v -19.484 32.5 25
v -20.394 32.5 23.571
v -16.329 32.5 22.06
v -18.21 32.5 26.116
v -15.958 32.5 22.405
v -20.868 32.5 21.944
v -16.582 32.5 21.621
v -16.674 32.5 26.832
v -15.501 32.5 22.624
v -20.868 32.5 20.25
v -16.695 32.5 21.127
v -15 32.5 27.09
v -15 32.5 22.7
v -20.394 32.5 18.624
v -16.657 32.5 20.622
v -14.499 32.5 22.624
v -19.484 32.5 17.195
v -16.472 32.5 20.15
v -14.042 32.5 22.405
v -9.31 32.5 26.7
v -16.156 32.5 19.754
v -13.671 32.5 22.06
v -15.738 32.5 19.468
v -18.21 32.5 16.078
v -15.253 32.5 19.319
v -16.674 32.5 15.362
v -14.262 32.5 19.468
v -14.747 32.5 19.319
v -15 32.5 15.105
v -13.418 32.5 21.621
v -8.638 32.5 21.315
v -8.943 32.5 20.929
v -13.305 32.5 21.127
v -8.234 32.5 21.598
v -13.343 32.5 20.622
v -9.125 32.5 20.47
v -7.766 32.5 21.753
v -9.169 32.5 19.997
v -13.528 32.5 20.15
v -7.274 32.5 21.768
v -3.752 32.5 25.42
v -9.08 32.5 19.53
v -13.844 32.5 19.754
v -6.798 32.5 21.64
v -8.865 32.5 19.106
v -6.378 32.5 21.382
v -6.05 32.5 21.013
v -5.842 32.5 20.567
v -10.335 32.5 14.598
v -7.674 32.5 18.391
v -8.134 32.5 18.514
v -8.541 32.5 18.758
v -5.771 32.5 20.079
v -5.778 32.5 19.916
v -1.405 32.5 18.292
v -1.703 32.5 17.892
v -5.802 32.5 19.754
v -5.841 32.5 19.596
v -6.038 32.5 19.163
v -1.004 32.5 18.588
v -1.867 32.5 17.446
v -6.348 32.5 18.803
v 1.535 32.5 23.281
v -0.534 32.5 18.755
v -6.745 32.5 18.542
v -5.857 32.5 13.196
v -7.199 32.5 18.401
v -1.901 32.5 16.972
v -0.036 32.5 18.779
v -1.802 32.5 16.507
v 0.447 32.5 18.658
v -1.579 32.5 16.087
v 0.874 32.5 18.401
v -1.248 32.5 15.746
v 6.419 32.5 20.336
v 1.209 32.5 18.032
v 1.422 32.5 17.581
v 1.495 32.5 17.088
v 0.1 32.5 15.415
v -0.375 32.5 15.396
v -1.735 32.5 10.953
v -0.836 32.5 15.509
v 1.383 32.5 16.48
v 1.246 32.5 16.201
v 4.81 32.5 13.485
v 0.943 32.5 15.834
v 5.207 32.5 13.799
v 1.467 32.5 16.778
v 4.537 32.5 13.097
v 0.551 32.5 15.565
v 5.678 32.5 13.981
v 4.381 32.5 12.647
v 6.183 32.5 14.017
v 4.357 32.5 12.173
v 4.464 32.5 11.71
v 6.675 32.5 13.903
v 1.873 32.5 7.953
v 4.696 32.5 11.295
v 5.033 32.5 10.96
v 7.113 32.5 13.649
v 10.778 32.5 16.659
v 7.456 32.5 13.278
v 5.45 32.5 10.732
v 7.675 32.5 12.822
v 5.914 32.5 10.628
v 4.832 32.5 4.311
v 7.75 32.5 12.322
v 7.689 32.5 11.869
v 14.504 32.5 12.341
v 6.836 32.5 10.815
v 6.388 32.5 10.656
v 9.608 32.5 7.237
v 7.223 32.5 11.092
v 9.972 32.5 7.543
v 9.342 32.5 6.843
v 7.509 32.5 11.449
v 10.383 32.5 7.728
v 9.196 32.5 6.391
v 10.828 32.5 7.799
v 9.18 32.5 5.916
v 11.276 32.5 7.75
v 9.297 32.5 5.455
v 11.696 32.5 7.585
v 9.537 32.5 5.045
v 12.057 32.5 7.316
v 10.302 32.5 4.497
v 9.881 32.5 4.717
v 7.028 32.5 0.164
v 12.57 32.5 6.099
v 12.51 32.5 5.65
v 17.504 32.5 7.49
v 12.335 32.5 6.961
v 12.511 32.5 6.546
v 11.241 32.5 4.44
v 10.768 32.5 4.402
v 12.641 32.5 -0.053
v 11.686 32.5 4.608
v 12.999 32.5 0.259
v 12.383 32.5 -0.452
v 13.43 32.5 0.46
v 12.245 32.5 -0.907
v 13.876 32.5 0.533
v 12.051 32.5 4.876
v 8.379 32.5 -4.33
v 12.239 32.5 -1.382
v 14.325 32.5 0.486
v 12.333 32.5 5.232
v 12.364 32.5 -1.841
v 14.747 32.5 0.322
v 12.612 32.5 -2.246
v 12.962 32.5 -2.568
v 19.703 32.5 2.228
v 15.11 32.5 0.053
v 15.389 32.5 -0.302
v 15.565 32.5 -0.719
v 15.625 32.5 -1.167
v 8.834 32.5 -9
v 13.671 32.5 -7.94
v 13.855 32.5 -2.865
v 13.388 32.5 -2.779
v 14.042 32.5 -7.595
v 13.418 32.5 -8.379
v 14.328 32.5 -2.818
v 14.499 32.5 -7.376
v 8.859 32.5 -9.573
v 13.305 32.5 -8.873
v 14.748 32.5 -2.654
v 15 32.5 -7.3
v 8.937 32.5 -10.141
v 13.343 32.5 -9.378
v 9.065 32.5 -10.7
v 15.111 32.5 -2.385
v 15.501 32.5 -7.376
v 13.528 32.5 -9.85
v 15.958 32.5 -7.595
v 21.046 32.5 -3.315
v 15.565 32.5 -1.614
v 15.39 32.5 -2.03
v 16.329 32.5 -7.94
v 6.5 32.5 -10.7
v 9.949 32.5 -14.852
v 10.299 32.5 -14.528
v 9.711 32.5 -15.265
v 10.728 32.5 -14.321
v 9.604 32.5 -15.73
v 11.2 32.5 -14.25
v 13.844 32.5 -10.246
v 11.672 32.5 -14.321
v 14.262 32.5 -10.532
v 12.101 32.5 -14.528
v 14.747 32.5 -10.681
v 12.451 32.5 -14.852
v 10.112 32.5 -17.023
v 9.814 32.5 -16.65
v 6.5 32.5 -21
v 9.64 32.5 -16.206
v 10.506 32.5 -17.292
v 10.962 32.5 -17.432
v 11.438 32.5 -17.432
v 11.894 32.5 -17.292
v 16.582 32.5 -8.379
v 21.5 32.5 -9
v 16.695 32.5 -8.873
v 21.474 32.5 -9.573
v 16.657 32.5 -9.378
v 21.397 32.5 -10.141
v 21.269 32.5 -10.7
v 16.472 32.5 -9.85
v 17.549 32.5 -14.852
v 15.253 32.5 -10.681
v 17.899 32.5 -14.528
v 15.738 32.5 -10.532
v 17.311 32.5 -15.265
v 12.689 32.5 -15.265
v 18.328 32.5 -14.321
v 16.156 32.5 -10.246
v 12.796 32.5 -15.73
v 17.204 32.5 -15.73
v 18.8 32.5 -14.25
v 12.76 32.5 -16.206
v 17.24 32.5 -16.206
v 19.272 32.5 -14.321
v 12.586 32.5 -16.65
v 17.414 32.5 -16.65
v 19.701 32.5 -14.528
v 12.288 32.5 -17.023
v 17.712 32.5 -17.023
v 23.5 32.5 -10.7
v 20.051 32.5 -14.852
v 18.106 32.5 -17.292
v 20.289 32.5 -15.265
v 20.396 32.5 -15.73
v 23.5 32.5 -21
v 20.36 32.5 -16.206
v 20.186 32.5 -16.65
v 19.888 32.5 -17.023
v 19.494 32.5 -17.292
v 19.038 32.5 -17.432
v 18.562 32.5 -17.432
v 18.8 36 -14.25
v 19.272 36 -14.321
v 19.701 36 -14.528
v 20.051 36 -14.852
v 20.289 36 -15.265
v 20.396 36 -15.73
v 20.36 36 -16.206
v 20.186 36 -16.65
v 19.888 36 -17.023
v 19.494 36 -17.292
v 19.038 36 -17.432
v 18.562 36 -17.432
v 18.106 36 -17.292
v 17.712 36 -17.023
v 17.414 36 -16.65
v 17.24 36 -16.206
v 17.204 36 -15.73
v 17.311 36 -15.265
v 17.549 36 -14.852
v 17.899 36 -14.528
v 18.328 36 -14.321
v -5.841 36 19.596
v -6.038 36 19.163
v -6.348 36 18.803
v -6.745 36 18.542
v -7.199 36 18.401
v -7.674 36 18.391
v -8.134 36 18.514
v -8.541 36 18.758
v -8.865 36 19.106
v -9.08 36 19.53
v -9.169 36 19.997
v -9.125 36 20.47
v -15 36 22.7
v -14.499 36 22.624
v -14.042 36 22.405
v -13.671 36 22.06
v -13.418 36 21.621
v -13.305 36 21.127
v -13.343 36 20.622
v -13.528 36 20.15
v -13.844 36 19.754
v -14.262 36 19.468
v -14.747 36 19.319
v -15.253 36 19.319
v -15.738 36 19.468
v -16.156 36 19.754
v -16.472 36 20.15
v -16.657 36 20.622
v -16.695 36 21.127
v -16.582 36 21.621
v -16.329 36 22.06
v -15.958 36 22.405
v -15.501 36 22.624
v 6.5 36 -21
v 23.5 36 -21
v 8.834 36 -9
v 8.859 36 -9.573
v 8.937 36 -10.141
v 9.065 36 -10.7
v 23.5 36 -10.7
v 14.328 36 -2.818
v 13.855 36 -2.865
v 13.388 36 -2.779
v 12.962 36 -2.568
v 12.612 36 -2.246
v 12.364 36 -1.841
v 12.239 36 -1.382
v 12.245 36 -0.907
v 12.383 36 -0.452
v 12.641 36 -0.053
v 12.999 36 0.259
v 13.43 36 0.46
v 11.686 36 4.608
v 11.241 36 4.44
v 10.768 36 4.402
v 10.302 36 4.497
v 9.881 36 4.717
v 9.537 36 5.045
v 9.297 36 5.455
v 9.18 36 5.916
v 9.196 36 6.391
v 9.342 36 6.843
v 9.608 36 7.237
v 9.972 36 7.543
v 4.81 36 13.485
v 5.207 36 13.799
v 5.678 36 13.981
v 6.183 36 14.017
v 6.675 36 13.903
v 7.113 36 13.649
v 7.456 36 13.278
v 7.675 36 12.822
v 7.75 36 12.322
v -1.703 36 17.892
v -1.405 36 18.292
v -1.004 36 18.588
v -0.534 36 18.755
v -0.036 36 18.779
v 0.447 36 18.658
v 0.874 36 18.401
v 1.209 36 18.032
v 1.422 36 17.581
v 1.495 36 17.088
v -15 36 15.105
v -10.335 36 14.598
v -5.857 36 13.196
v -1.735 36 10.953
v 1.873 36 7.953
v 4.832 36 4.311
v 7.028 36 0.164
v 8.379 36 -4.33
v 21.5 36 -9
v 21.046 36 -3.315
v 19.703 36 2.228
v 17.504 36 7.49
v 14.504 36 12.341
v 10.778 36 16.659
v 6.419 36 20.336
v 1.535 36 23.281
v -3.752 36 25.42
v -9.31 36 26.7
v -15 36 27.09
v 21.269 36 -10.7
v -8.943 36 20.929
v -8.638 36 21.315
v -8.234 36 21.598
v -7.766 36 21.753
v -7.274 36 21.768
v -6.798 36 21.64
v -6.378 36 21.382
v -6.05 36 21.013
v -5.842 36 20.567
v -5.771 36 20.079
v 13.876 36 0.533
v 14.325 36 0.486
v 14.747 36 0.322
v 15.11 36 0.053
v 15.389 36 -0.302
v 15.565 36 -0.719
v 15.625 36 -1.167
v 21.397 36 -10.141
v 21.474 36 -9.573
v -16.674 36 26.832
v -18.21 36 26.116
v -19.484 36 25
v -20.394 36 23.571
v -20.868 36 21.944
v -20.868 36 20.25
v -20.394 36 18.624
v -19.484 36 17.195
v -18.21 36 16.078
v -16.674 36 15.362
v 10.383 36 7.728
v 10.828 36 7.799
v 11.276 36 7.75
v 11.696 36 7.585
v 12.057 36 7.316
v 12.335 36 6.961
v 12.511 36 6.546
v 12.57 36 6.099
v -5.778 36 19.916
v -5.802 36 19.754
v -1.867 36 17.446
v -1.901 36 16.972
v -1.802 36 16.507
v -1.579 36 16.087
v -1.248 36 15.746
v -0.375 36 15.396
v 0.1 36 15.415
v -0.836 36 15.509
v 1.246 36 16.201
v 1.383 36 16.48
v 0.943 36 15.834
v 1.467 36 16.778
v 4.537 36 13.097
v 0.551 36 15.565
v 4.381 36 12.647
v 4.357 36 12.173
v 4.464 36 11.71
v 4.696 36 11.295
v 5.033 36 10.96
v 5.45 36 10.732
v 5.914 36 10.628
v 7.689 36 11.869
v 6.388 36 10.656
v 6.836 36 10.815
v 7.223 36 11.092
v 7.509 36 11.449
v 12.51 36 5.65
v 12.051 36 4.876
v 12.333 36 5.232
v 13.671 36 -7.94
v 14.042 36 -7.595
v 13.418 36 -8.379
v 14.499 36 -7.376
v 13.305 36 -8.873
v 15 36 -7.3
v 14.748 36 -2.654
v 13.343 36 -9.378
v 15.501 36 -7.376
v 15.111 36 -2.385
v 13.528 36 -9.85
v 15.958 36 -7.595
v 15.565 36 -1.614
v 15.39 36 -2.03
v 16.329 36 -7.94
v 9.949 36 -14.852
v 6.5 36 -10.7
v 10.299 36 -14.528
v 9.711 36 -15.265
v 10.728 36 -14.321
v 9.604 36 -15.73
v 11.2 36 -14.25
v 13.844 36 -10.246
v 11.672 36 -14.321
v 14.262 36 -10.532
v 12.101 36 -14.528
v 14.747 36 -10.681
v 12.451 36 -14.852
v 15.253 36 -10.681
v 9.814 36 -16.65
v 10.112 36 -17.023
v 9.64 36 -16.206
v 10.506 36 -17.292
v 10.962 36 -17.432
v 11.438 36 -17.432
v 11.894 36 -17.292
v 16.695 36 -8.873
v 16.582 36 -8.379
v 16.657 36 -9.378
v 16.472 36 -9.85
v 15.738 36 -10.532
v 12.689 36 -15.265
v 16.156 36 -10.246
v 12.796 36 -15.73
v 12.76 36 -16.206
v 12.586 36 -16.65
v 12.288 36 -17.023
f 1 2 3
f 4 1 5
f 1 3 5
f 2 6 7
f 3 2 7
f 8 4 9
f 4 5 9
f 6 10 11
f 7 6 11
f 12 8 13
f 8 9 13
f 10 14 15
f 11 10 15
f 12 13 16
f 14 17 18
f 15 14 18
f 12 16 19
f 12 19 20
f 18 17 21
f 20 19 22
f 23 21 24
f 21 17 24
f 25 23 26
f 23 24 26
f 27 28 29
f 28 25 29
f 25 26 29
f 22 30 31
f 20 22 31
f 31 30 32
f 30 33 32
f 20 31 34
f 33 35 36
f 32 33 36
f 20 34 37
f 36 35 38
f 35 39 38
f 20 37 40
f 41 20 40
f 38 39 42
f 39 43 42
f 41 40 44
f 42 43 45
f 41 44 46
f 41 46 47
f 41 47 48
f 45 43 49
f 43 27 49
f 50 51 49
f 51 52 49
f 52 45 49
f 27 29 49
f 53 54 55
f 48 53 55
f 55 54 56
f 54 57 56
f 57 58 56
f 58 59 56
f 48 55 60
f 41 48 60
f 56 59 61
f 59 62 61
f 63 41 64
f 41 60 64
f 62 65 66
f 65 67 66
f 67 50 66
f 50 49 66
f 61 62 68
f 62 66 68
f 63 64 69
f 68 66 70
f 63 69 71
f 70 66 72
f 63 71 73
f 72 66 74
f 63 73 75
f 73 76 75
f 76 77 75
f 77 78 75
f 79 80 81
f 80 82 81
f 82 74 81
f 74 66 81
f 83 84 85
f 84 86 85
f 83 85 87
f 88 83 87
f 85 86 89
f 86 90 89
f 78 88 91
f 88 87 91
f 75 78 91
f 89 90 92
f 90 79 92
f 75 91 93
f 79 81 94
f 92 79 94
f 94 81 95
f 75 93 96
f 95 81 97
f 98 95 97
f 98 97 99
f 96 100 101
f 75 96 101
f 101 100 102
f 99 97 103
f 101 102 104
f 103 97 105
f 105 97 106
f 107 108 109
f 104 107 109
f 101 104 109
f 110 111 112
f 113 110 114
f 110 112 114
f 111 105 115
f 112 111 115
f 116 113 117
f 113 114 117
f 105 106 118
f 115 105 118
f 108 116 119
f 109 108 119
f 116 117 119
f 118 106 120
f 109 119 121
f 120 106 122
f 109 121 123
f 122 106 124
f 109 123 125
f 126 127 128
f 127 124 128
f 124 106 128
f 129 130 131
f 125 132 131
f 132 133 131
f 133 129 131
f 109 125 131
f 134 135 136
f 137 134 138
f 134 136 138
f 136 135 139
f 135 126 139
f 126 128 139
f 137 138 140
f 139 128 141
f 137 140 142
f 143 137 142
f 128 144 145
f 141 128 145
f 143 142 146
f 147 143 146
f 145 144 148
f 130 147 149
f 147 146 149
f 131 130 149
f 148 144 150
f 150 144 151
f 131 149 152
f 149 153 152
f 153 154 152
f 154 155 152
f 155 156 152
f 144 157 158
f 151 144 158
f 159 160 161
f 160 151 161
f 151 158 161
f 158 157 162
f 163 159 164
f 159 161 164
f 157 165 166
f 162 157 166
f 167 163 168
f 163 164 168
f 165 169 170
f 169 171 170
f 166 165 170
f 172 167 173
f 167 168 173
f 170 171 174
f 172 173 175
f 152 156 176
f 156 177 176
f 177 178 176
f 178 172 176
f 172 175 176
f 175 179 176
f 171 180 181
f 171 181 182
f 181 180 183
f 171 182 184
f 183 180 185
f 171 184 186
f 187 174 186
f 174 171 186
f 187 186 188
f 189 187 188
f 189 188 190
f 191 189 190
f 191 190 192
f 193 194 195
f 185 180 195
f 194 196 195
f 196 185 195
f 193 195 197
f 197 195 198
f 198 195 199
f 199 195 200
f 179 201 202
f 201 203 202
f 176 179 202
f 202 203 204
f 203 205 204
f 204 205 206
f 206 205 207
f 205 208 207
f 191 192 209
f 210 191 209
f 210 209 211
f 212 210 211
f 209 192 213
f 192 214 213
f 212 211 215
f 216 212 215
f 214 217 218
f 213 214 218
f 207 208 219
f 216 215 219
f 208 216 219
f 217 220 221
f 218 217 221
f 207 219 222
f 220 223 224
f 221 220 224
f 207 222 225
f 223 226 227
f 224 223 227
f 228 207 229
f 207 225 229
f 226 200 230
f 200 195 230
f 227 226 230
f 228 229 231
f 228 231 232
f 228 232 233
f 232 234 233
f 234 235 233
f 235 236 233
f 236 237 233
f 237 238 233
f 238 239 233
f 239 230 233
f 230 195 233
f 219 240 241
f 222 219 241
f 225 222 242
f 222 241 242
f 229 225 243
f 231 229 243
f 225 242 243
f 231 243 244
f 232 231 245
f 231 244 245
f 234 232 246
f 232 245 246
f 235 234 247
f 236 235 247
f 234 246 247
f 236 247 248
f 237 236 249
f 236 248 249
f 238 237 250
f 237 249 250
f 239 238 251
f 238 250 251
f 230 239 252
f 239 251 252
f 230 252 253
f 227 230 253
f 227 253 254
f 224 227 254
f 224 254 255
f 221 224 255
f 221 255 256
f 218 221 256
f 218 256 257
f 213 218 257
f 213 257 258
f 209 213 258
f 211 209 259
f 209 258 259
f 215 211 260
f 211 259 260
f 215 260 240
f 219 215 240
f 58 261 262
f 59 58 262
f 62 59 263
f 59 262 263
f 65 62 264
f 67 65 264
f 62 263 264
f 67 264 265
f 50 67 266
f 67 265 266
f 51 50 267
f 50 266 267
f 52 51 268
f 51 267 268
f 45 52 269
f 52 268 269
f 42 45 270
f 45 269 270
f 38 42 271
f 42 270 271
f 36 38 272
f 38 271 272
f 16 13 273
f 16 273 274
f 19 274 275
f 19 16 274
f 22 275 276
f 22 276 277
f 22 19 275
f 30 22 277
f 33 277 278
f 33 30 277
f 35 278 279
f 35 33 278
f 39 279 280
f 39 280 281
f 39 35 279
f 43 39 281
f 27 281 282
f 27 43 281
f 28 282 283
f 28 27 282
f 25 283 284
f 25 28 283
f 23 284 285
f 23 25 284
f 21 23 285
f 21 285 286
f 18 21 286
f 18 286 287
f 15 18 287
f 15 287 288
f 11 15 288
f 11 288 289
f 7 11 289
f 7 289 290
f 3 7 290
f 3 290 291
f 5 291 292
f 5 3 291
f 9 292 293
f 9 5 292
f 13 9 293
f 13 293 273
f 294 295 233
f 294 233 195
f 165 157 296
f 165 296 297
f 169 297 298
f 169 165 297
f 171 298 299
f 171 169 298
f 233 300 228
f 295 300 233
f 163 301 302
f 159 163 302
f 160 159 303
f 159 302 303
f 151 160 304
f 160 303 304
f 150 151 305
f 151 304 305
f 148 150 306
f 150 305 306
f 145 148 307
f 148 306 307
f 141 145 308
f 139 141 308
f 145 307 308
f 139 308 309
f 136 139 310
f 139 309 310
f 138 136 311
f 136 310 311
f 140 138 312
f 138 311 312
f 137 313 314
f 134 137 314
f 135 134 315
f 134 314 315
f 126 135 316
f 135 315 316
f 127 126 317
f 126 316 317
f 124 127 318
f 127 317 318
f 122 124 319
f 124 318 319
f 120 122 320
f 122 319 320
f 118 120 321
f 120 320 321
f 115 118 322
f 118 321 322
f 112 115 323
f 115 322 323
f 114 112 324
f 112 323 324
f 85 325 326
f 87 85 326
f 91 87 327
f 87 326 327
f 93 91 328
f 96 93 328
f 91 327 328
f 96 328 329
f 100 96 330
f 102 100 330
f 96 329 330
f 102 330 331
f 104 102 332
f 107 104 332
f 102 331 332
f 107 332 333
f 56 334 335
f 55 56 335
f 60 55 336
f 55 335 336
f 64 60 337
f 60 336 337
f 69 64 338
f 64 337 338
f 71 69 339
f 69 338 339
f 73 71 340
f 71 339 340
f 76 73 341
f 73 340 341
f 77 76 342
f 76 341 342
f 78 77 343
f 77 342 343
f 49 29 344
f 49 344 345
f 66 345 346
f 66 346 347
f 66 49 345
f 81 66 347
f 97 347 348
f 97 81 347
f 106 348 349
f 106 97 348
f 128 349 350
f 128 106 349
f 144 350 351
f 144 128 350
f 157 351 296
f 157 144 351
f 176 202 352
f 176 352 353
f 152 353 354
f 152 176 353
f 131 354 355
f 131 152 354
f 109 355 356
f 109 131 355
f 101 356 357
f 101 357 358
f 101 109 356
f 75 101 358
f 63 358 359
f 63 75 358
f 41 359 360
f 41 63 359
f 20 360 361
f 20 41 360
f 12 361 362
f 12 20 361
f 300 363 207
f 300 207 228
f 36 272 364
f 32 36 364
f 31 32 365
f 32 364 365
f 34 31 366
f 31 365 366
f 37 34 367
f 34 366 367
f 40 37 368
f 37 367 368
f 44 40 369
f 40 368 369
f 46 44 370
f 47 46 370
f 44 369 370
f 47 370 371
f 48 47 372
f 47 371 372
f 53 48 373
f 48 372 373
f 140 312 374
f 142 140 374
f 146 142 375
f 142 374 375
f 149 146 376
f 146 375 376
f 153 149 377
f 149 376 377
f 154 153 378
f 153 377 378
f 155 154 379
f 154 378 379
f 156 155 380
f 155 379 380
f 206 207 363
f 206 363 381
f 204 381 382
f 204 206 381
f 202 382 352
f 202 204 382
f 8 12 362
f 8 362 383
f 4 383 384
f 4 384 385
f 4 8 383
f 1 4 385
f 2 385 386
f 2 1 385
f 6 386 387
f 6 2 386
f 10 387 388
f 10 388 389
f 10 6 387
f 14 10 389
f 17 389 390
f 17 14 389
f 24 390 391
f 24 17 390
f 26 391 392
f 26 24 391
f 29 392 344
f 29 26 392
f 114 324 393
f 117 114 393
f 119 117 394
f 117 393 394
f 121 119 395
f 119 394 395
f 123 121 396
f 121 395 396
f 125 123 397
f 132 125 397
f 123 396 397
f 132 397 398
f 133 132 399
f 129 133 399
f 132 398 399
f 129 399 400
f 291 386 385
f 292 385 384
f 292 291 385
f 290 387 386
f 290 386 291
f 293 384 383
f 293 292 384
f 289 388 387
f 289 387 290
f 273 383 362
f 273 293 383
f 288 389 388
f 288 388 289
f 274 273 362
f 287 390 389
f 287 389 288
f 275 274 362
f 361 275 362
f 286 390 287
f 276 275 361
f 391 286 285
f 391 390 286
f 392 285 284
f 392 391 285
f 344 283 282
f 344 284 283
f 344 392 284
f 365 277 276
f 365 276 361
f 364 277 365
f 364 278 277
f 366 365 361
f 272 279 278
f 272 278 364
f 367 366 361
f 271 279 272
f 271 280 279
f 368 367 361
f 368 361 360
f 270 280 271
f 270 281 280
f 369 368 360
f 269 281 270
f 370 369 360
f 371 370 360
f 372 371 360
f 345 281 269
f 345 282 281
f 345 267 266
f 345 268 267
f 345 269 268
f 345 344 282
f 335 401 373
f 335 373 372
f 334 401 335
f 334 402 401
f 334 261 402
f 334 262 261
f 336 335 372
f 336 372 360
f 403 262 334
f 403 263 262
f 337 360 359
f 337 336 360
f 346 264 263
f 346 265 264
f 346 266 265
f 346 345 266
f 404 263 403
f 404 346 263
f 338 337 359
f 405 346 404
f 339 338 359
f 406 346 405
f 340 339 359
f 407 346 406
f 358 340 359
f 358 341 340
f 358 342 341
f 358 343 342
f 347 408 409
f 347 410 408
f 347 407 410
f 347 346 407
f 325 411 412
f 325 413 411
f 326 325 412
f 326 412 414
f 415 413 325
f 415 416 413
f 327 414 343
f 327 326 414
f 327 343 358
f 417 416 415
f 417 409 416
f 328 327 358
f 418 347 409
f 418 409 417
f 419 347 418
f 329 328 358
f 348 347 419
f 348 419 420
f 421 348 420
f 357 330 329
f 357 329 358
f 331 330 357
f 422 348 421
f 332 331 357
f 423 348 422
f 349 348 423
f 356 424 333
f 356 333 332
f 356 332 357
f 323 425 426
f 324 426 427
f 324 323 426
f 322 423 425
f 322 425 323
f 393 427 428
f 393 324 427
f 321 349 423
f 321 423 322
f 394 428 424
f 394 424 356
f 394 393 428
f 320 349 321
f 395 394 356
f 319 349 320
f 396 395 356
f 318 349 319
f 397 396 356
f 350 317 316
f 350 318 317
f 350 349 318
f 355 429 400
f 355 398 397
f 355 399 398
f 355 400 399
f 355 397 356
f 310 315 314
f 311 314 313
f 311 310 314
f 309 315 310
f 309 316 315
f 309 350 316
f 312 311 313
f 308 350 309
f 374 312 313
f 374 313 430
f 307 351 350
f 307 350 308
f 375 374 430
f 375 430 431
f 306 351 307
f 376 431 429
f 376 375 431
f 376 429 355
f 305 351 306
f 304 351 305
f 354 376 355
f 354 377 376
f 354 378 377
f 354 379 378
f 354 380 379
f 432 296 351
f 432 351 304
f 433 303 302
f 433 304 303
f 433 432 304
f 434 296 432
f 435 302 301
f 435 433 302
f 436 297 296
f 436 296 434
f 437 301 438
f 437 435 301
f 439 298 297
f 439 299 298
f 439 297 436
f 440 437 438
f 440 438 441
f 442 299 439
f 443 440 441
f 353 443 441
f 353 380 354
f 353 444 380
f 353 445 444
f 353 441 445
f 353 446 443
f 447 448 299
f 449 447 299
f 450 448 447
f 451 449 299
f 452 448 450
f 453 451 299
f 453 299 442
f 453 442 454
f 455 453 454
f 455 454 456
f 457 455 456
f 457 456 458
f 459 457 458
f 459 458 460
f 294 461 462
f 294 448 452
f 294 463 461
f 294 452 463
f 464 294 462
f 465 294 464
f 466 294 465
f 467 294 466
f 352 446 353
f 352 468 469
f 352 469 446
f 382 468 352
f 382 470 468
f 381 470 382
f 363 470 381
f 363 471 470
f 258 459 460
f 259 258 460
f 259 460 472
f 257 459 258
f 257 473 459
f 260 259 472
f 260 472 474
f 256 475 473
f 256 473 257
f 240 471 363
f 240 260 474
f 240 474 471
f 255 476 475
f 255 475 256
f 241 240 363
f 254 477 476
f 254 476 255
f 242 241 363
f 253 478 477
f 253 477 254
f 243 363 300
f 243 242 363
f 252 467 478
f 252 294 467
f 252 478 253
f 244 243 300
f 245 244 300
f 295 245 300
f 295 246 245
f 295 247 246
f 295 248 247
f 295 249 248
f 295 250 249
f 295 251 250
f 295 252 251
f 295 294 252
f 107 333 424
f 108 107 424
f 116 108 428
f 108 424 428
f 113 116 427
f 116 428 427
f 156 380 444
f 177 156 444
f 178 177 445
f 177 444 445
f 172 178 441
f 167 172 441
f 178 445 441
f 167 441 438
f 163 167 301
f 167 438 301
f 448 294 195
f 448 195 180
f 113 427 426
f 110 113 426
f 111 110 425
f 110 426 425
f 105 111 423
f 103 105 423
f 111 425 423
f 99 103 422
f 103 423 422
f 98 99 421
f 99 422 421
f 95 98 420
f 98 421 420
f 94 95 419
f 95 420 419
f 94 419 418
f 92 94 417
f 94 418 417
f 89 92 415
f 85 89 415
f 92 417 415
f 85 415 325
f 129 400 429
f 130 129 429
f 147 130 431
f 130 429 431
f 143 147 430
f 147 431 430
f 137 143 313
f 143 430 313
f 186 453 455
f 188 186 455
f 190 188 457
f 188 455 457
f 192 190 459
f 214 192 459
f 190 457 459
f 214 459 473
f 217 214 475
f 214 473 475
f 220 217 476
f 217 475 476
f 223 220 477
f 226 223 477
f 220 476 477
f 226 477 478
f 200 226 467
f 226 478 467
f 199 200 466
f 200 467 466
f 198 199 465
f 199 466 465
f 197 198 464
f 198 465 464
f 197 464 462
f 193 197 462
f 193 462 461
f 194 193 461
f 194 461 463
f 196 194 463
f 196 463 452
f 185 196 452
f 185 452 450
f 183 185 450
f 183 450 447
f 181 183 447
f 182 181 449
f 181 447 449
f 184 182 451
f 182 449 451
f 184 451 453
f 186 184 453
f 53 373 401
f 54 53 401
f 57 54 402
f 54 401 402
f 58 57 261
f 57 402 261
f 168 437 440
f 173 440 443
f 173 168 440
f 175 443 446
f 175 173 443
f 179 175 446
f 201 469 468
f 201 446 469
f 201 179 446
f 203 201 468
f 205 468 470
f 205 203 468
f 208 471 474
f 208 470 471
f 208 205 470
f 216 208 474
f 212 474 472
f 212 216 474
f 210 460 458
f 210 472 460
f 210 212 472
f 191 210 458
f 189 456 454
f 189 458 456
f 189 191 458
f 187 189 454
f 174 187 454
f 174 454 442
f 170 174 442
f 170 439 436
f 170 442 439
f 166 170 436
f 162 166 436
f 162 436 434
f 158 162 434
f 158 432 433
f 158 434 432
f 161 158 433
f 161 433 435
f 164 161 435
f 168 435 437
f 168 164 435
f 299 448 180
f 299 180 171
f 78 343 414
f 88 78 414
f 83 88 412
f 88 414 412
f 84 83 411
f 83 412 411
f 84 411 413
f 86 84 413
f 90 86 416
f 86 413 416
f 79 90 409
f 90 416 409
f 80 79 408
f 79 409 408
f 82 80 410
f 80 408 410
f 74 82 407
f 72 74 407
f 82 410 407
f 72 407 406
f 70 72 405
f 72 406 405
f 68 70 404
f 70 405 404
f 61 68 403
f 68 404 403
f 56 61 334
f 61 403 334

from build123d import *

# Parameters (mm, degrees)
ESBO_O1_W                = 50
ESBO_O1_H                = 11
RESSALTO_EXTRUS_O1_DEPTH = 22.5
ESBO_O2_W                = 46
ESBO_O2_H                = 7
CORTE_EXTRUS_O1_DEPTH    = 20.5
ESBO_O3_W                = 10.97916057
ESBO_O3_H                = 2
CORTE_EXTRUS_O2_DEPTH    = 4
CORTE_EXTRUS_O3_DEPTH    = 4
ESBO_O9_W                = 50
ESBO_O9_H                = 4
RESSALTO_EXTRUS_O4_DEPTH = 7
ESBO_O13_R               = 1.5
CORTE_EXTRUS_O4_DEPTH    = 7
ESBO_O19_W               = 9
ESBO_O19_H               = 4
RESSALTO_EXTRUS_O5_DEPTH = 22.5
ESBO_O20_R               = 1.7
RESSALTO_EXTRUS_O7_DEPTH = 3.5
ESBO_O21_W               = 68.510383691
ESBO_O21_H               = 66.833312069
CORTE_EXTRUS_O7_DEPTH    = 50.144843501
CORTE_EXTRUS_O8_DEPTH    = 35.762993058
RESSALTO_EXTRUS_O9_DEPTH = 3.5
ESBO_O24_R               = 1.6
CORTE_EXTRUS_O9_DEPTH    = 3.5


with BuildPart() as part:
    # Esboço1 → Ressalto-extrusão1 (new body)
    with BuildSketch(Plane(origin=(0, 0, 0), x_dir=(1, 0, 0), z_dir=(0, 1, 0))):
        Rectangle(ESBO_O1_W, ESBO_O1_H)
    extrude(amount=RESSALTO_EXTRUS_O1_DEPTH)

    # Esboço2 → Corte-extrusão1 (cut)
    with BuildSketch(Plane(origin=(0, 22.5, 0), x_dir=(1, 0, 0), z_dir=(0, 1, 0))):
        Rectangle(ESBO_O2_W, ESBO_O2_H)
    extrude(amount=-CORTE_EXTRUS_O1_DEPTH, mode=Mode.SUBTRACT)

    # Esboço3 → Corte-extrusão2 (cut)
    with BuildSketch(Plane(origin=(0, 22.5, 0), x_dir=(1, 0, 0), z_dir=(0, 1, 0))):
        with Locations((0, 4.5)):
            Rectangle(ESBO_O3_W, ESBO_O3_H)
    extrude(amount=-CORTE_EXTRUS_O2_DEPTH, mode=Mode.SUBTRACT)

    # Esboço5 → Corte-extrusão3 (cut)
    with BuildSketch(Plane.XY.offset(5.5)):
        with BuildLine():
            Line((-21, 22.5), (-4.5, 22.5))
            Line((-4.5, 22.5), (-4.5, 11.75))
            ThreePointArc((-4.5, 11.75), (-12.75, 3.5), (-21, 11.75))
            Line((-21, 11.75), (-21, 22.5))
        make_face()
        with BuildLine():
            Line((4.5, 22.5), (21, 22.5))
            Line((21, 22.5), (21, 11.75))
            ThreePointArc((21, 11.75), (12.75, 3.5), (4.5, 11.75))
            Line((4.5, 11.75), (4.5, 22.5))
        make_face()
    extrude(amount=-CORTE_EXTRUS_O3_DEPTH, mode=Mode.SUBTRACT)

    # Esboço9 → Ressalto-extrusão4 (add)
    with BuildSketch(Plane(origin=(0, 0, -5.5), x_dir=(-1, 0, 0), z_dir=(0, 0, -1))):
        with Locations((0, 2)):
            Rectangle(ESBO_O9_W, ESBO_O9_H)
    extrude(amount=RESSALTO_EXTRUS_O4_DEPTH)

    # Esboço13 → Corte-extrusão4 (cut)
    with BuildSketch(Plane(origin=(0, 4, 0), x_dir=(1, 0, 0), z_dir=(0, 1, 0))):
        with Locations(Location((10, 9, 0), (0, 0, 270))):
            Circle(ESBO_O13_R)
        with Locations(Location((5, 9, 0), (0, 0, 270))):
            Circle(ESBO_O13_R)
        with Locations(Location((20, 9, 0), (0, 0, 270))):
            Circle(ESBO_O13_R)
        with Locations(Location((15, 9, 0), (0, 0, 270))):
            Circle(ESBO_O13_R)
        with Locations(Location((0, 9, 0), (0, 0, 270))):
            Circle(ESBO_O13_R)
        with Locations(Location((-5, 9, 0), (0, 0, 270))):
            Circle(ESBO_O13_R)
        with Locations(Location((-10, 9, 0), (0, 0, 270))):
            Circle(ESBO_O13_R)
        with Locations(Location((-15, 9, 0), (0, 0, 270))):
            Circle(ESBO_O13_R)
        with Locations(Location((-20, 9, 0), (0, 0, 270))):
            Circle(ESBO_O13_R)
    extrude(amount=-CORTE_EXTRUS_O4_DEPTH, mode=Mode.SUBTRACT)

    # Esboço19 → Ressalto-extrusão5 (add)
    with BuildSketch(Plane(origin=(0, 22.5, 0), x_dir=(1, 0, 0), z_dir=(0, 1, 0))):
        with Locations((0, -5.5)):
            Rectangle(ESBO_O19_W, ESBO_O19_H)
    extrude(amount=-RESSALTO_EXTRUS_O5_DEPTH)

    # Esboço21 → Corte-extrusão7 (cut, through all)
    with BuildSketch(Plane(origin=(0, 32.5, 0), x_dir=(1, 0, 0), z_dir=(0, 1, 0))):
        with Locations((0.009195905, -3.607588671)):
            Rectangle(ESBO_O21_W, ESBO_O21_H)
    extrude(amount=-CORTE_EXTRUS_O7_DEPTH, mode=Mode.SUBTRACT)


with BuildPart() as body_2:
    # Esboço20 → Ressalto-extrusão7 (new body)
    with BuildSketch(Plane(origin=(0, 32.5, 0), x_dir=(1, 0, 0), z_dir=(0, 1, 0))):
        with BuildLine():
            ThreePointArc((8.833758049, 9), (15.166879024, 15.336707535), (21.5, 9))
            ThreePointArc((21.5, 9), (10.778241796, -16.658684905), (-15, -27.089718411))
            ThreePointArc((-15, -27.089718411), (-20.92850101, -21.097213824), (-15, -15.104709238))
            ThreePointArc((-15, -15.104709238), (1.873258871, -7.953021825), (8.833758049, 9))
        make_face()
        with Locations(Location((15, 9, 0), (0, 0, 270))):
            Circle(ESBO_O20_R, mode=Mode.SUBTRACT)
        with Locations(Location((-15, -21, 0), (0, 0, 270))):
            Circle(ESBO_O20_R, mode=Mode.SUBTRACT)
    extrude(amount=RESSALTO_EXTRUS_O7_DEPTH)

    # Esboço22 → Corte-extrusão8 (cut, through all)
    with BuildSketch(Plane(origin=(0, 36, 0), x_dir=(1, 0, 0), z_dir=(0, 1, 0))):
        with BuildLine():
            ThreePointArc((1.24551884, -16.20086225), (-1.05060257, -15.613093269), (-1.702635259, -17.891798883))
            ThreePointArc((-1.702635259, -17.891798883), (-0.204800523, -17.087752178), (1.24551884, -16.20086225))
        make_face()
        with BuildLine():
            ThreePointArc((1.24551884, -16.20086225), (-0.204800523, -17.087752178), (-1.702635259, -17.891798883))
            ThreePointArc((-1.702635259, -17.891798883), (0.209735934, -18.736436358), (1.495199477, -17.087752178))
            ThreePointArc((1.495199477, -17.087752178), (1.43158924, -16.627069487), (1.24551884, -16.20086225))
        make_face()
        with BuildLine():
            ThreePointArc((-5.840861487, -19.595514274), (-7.908251051, -18.436399829), (-9.12497893, -20.470415359))
            ThreePointArc((-9.12497893, -20.470415359), (-7.470627834, -20.079106718), (-5.840861487, -19.595514274))
        make_face()
        with BuildLine():
            ThreePointArc((-5.840861487, -19.595514274), (-7.470627834, -20.079106718), (-9.12497893, -20.470415359))
            ThreePointArc((-9.12497893, -20.470415359), (-7.273646696, -21.767655927), (-5.770627834, -20.079106718))
            ThreePointArc((-5.770627834, -20.079106718), (-5.788277872, -19.834773739), (-5.840861487, -19.595514274))
        make_face()
        with BuildLine():
            ThreePointArc((7.222954726, -11.091822097), (4.852915515, -11.115487395), (4.809999578, -13.485256187))
            ThreePointArc((4.809999578, -13.485256187), (6.050104938, -12.3224412), (7.222954726, -11.091822097))
        make_face()
        with BuildLine():
            ThreePointArc((7.222954726, -11.091822097), (6.050104938, -12.3224412), (4.809999578, -13.485256187))
            ThreePointArc((4.809999578, -13.485256187), (6.675333252, -13.903292096), (7.750104938, -12.3224412))
            ThreePointArc((7.750104938, -12.3224412), (7.612770072, -11.653055152), (7.222954726, -11.091822097))
        make_face()
        with BuildLine():
            ThreePointArc((11.686065273, -4.607737974), (9.402313913, -5.241871738), (9.972049301, -7.542534141))
            ThreePointArc((9.972049301, -7.542534141), (10.870291219, -6.099218009), (11.686065273, -4.607737974))
        make_face()
        with BuildLine():
            ThreePointArc((11.686065273, -4.607737974), (10.870291219, -6.099218009), (9.972049301, -7.542534141))
            ThreePointArc((9.972049301, -7.542534141), (11.695817941, -7.585322188), (12.570291219, -6.099218009))
            ThreePointArc((12.570291219, -6.099218009), (12.332620849, -5.232273919), (11.686065273, -4.607737974))
        make_face()
        with BuildLine():
            ThreePointArc((14.327996178, 2.818153576), (12.285471778, 1.615764297), (13.430014274, -0.459728025))
            ThreePointArc((13.430014274, -0.459728025), (13.925059514, 1.166596116), (14.327996178, 2.818153576))
        make_face()
        with BuildLine():
            ThreePointArc((14.327996178, 2.818153576), (13.925059514, 1.166596116), (13.430014274, -0.459728025))
            ThreePointArc((13.430014274, -0.459728025), (14.937092886, -0.199342556), (15.625059514, 1.166596116))
            ThreePointArc((15.625059514, 1.166596116), (15.262032275, 2.216597942), (14.327996178, 2.818153576))
        make_face()
    extrude(amount=-CORTE_EXTRUS_O8_DEPTH, mode=Mode.SUBTRACT)

    # Esboço23 → Ressalto-extrusão9 (add)
    with BuildSketch(Plane(origin=(0, 36, 0), x_dir=(1, 0, 0), z_dir=(0, 1, 0))):
        Polygon((15, 10.7), (23.5, 10.7), (23.5, 21), (6.5, 21), (6.5, 10.7), align=None)
    extrude(amount=-RESSALTO_EXTRUS_O9_DEPTH)

    # Esboço24 → Corte-extrusão9 (cut)
    with BuildSketch(Plane(origin=(0, 36, 0), x_dir=(1, 0, 0), z_dir=(0, 1, 0))):
        with Locations(Location((11.2, 15.85, 0), (0, 0, 270))):
            Circle(ESBO_O24_R)
        with Locations(Location((18.8, 15.85, 0), (0, 0, 270))):
            Circle(ESBO_O24_R)
    extrude(amount=-CORTE_EXTRUS_O9_DEPTH, mode=Mode.SUBTRACT)


solid = body_2.part
